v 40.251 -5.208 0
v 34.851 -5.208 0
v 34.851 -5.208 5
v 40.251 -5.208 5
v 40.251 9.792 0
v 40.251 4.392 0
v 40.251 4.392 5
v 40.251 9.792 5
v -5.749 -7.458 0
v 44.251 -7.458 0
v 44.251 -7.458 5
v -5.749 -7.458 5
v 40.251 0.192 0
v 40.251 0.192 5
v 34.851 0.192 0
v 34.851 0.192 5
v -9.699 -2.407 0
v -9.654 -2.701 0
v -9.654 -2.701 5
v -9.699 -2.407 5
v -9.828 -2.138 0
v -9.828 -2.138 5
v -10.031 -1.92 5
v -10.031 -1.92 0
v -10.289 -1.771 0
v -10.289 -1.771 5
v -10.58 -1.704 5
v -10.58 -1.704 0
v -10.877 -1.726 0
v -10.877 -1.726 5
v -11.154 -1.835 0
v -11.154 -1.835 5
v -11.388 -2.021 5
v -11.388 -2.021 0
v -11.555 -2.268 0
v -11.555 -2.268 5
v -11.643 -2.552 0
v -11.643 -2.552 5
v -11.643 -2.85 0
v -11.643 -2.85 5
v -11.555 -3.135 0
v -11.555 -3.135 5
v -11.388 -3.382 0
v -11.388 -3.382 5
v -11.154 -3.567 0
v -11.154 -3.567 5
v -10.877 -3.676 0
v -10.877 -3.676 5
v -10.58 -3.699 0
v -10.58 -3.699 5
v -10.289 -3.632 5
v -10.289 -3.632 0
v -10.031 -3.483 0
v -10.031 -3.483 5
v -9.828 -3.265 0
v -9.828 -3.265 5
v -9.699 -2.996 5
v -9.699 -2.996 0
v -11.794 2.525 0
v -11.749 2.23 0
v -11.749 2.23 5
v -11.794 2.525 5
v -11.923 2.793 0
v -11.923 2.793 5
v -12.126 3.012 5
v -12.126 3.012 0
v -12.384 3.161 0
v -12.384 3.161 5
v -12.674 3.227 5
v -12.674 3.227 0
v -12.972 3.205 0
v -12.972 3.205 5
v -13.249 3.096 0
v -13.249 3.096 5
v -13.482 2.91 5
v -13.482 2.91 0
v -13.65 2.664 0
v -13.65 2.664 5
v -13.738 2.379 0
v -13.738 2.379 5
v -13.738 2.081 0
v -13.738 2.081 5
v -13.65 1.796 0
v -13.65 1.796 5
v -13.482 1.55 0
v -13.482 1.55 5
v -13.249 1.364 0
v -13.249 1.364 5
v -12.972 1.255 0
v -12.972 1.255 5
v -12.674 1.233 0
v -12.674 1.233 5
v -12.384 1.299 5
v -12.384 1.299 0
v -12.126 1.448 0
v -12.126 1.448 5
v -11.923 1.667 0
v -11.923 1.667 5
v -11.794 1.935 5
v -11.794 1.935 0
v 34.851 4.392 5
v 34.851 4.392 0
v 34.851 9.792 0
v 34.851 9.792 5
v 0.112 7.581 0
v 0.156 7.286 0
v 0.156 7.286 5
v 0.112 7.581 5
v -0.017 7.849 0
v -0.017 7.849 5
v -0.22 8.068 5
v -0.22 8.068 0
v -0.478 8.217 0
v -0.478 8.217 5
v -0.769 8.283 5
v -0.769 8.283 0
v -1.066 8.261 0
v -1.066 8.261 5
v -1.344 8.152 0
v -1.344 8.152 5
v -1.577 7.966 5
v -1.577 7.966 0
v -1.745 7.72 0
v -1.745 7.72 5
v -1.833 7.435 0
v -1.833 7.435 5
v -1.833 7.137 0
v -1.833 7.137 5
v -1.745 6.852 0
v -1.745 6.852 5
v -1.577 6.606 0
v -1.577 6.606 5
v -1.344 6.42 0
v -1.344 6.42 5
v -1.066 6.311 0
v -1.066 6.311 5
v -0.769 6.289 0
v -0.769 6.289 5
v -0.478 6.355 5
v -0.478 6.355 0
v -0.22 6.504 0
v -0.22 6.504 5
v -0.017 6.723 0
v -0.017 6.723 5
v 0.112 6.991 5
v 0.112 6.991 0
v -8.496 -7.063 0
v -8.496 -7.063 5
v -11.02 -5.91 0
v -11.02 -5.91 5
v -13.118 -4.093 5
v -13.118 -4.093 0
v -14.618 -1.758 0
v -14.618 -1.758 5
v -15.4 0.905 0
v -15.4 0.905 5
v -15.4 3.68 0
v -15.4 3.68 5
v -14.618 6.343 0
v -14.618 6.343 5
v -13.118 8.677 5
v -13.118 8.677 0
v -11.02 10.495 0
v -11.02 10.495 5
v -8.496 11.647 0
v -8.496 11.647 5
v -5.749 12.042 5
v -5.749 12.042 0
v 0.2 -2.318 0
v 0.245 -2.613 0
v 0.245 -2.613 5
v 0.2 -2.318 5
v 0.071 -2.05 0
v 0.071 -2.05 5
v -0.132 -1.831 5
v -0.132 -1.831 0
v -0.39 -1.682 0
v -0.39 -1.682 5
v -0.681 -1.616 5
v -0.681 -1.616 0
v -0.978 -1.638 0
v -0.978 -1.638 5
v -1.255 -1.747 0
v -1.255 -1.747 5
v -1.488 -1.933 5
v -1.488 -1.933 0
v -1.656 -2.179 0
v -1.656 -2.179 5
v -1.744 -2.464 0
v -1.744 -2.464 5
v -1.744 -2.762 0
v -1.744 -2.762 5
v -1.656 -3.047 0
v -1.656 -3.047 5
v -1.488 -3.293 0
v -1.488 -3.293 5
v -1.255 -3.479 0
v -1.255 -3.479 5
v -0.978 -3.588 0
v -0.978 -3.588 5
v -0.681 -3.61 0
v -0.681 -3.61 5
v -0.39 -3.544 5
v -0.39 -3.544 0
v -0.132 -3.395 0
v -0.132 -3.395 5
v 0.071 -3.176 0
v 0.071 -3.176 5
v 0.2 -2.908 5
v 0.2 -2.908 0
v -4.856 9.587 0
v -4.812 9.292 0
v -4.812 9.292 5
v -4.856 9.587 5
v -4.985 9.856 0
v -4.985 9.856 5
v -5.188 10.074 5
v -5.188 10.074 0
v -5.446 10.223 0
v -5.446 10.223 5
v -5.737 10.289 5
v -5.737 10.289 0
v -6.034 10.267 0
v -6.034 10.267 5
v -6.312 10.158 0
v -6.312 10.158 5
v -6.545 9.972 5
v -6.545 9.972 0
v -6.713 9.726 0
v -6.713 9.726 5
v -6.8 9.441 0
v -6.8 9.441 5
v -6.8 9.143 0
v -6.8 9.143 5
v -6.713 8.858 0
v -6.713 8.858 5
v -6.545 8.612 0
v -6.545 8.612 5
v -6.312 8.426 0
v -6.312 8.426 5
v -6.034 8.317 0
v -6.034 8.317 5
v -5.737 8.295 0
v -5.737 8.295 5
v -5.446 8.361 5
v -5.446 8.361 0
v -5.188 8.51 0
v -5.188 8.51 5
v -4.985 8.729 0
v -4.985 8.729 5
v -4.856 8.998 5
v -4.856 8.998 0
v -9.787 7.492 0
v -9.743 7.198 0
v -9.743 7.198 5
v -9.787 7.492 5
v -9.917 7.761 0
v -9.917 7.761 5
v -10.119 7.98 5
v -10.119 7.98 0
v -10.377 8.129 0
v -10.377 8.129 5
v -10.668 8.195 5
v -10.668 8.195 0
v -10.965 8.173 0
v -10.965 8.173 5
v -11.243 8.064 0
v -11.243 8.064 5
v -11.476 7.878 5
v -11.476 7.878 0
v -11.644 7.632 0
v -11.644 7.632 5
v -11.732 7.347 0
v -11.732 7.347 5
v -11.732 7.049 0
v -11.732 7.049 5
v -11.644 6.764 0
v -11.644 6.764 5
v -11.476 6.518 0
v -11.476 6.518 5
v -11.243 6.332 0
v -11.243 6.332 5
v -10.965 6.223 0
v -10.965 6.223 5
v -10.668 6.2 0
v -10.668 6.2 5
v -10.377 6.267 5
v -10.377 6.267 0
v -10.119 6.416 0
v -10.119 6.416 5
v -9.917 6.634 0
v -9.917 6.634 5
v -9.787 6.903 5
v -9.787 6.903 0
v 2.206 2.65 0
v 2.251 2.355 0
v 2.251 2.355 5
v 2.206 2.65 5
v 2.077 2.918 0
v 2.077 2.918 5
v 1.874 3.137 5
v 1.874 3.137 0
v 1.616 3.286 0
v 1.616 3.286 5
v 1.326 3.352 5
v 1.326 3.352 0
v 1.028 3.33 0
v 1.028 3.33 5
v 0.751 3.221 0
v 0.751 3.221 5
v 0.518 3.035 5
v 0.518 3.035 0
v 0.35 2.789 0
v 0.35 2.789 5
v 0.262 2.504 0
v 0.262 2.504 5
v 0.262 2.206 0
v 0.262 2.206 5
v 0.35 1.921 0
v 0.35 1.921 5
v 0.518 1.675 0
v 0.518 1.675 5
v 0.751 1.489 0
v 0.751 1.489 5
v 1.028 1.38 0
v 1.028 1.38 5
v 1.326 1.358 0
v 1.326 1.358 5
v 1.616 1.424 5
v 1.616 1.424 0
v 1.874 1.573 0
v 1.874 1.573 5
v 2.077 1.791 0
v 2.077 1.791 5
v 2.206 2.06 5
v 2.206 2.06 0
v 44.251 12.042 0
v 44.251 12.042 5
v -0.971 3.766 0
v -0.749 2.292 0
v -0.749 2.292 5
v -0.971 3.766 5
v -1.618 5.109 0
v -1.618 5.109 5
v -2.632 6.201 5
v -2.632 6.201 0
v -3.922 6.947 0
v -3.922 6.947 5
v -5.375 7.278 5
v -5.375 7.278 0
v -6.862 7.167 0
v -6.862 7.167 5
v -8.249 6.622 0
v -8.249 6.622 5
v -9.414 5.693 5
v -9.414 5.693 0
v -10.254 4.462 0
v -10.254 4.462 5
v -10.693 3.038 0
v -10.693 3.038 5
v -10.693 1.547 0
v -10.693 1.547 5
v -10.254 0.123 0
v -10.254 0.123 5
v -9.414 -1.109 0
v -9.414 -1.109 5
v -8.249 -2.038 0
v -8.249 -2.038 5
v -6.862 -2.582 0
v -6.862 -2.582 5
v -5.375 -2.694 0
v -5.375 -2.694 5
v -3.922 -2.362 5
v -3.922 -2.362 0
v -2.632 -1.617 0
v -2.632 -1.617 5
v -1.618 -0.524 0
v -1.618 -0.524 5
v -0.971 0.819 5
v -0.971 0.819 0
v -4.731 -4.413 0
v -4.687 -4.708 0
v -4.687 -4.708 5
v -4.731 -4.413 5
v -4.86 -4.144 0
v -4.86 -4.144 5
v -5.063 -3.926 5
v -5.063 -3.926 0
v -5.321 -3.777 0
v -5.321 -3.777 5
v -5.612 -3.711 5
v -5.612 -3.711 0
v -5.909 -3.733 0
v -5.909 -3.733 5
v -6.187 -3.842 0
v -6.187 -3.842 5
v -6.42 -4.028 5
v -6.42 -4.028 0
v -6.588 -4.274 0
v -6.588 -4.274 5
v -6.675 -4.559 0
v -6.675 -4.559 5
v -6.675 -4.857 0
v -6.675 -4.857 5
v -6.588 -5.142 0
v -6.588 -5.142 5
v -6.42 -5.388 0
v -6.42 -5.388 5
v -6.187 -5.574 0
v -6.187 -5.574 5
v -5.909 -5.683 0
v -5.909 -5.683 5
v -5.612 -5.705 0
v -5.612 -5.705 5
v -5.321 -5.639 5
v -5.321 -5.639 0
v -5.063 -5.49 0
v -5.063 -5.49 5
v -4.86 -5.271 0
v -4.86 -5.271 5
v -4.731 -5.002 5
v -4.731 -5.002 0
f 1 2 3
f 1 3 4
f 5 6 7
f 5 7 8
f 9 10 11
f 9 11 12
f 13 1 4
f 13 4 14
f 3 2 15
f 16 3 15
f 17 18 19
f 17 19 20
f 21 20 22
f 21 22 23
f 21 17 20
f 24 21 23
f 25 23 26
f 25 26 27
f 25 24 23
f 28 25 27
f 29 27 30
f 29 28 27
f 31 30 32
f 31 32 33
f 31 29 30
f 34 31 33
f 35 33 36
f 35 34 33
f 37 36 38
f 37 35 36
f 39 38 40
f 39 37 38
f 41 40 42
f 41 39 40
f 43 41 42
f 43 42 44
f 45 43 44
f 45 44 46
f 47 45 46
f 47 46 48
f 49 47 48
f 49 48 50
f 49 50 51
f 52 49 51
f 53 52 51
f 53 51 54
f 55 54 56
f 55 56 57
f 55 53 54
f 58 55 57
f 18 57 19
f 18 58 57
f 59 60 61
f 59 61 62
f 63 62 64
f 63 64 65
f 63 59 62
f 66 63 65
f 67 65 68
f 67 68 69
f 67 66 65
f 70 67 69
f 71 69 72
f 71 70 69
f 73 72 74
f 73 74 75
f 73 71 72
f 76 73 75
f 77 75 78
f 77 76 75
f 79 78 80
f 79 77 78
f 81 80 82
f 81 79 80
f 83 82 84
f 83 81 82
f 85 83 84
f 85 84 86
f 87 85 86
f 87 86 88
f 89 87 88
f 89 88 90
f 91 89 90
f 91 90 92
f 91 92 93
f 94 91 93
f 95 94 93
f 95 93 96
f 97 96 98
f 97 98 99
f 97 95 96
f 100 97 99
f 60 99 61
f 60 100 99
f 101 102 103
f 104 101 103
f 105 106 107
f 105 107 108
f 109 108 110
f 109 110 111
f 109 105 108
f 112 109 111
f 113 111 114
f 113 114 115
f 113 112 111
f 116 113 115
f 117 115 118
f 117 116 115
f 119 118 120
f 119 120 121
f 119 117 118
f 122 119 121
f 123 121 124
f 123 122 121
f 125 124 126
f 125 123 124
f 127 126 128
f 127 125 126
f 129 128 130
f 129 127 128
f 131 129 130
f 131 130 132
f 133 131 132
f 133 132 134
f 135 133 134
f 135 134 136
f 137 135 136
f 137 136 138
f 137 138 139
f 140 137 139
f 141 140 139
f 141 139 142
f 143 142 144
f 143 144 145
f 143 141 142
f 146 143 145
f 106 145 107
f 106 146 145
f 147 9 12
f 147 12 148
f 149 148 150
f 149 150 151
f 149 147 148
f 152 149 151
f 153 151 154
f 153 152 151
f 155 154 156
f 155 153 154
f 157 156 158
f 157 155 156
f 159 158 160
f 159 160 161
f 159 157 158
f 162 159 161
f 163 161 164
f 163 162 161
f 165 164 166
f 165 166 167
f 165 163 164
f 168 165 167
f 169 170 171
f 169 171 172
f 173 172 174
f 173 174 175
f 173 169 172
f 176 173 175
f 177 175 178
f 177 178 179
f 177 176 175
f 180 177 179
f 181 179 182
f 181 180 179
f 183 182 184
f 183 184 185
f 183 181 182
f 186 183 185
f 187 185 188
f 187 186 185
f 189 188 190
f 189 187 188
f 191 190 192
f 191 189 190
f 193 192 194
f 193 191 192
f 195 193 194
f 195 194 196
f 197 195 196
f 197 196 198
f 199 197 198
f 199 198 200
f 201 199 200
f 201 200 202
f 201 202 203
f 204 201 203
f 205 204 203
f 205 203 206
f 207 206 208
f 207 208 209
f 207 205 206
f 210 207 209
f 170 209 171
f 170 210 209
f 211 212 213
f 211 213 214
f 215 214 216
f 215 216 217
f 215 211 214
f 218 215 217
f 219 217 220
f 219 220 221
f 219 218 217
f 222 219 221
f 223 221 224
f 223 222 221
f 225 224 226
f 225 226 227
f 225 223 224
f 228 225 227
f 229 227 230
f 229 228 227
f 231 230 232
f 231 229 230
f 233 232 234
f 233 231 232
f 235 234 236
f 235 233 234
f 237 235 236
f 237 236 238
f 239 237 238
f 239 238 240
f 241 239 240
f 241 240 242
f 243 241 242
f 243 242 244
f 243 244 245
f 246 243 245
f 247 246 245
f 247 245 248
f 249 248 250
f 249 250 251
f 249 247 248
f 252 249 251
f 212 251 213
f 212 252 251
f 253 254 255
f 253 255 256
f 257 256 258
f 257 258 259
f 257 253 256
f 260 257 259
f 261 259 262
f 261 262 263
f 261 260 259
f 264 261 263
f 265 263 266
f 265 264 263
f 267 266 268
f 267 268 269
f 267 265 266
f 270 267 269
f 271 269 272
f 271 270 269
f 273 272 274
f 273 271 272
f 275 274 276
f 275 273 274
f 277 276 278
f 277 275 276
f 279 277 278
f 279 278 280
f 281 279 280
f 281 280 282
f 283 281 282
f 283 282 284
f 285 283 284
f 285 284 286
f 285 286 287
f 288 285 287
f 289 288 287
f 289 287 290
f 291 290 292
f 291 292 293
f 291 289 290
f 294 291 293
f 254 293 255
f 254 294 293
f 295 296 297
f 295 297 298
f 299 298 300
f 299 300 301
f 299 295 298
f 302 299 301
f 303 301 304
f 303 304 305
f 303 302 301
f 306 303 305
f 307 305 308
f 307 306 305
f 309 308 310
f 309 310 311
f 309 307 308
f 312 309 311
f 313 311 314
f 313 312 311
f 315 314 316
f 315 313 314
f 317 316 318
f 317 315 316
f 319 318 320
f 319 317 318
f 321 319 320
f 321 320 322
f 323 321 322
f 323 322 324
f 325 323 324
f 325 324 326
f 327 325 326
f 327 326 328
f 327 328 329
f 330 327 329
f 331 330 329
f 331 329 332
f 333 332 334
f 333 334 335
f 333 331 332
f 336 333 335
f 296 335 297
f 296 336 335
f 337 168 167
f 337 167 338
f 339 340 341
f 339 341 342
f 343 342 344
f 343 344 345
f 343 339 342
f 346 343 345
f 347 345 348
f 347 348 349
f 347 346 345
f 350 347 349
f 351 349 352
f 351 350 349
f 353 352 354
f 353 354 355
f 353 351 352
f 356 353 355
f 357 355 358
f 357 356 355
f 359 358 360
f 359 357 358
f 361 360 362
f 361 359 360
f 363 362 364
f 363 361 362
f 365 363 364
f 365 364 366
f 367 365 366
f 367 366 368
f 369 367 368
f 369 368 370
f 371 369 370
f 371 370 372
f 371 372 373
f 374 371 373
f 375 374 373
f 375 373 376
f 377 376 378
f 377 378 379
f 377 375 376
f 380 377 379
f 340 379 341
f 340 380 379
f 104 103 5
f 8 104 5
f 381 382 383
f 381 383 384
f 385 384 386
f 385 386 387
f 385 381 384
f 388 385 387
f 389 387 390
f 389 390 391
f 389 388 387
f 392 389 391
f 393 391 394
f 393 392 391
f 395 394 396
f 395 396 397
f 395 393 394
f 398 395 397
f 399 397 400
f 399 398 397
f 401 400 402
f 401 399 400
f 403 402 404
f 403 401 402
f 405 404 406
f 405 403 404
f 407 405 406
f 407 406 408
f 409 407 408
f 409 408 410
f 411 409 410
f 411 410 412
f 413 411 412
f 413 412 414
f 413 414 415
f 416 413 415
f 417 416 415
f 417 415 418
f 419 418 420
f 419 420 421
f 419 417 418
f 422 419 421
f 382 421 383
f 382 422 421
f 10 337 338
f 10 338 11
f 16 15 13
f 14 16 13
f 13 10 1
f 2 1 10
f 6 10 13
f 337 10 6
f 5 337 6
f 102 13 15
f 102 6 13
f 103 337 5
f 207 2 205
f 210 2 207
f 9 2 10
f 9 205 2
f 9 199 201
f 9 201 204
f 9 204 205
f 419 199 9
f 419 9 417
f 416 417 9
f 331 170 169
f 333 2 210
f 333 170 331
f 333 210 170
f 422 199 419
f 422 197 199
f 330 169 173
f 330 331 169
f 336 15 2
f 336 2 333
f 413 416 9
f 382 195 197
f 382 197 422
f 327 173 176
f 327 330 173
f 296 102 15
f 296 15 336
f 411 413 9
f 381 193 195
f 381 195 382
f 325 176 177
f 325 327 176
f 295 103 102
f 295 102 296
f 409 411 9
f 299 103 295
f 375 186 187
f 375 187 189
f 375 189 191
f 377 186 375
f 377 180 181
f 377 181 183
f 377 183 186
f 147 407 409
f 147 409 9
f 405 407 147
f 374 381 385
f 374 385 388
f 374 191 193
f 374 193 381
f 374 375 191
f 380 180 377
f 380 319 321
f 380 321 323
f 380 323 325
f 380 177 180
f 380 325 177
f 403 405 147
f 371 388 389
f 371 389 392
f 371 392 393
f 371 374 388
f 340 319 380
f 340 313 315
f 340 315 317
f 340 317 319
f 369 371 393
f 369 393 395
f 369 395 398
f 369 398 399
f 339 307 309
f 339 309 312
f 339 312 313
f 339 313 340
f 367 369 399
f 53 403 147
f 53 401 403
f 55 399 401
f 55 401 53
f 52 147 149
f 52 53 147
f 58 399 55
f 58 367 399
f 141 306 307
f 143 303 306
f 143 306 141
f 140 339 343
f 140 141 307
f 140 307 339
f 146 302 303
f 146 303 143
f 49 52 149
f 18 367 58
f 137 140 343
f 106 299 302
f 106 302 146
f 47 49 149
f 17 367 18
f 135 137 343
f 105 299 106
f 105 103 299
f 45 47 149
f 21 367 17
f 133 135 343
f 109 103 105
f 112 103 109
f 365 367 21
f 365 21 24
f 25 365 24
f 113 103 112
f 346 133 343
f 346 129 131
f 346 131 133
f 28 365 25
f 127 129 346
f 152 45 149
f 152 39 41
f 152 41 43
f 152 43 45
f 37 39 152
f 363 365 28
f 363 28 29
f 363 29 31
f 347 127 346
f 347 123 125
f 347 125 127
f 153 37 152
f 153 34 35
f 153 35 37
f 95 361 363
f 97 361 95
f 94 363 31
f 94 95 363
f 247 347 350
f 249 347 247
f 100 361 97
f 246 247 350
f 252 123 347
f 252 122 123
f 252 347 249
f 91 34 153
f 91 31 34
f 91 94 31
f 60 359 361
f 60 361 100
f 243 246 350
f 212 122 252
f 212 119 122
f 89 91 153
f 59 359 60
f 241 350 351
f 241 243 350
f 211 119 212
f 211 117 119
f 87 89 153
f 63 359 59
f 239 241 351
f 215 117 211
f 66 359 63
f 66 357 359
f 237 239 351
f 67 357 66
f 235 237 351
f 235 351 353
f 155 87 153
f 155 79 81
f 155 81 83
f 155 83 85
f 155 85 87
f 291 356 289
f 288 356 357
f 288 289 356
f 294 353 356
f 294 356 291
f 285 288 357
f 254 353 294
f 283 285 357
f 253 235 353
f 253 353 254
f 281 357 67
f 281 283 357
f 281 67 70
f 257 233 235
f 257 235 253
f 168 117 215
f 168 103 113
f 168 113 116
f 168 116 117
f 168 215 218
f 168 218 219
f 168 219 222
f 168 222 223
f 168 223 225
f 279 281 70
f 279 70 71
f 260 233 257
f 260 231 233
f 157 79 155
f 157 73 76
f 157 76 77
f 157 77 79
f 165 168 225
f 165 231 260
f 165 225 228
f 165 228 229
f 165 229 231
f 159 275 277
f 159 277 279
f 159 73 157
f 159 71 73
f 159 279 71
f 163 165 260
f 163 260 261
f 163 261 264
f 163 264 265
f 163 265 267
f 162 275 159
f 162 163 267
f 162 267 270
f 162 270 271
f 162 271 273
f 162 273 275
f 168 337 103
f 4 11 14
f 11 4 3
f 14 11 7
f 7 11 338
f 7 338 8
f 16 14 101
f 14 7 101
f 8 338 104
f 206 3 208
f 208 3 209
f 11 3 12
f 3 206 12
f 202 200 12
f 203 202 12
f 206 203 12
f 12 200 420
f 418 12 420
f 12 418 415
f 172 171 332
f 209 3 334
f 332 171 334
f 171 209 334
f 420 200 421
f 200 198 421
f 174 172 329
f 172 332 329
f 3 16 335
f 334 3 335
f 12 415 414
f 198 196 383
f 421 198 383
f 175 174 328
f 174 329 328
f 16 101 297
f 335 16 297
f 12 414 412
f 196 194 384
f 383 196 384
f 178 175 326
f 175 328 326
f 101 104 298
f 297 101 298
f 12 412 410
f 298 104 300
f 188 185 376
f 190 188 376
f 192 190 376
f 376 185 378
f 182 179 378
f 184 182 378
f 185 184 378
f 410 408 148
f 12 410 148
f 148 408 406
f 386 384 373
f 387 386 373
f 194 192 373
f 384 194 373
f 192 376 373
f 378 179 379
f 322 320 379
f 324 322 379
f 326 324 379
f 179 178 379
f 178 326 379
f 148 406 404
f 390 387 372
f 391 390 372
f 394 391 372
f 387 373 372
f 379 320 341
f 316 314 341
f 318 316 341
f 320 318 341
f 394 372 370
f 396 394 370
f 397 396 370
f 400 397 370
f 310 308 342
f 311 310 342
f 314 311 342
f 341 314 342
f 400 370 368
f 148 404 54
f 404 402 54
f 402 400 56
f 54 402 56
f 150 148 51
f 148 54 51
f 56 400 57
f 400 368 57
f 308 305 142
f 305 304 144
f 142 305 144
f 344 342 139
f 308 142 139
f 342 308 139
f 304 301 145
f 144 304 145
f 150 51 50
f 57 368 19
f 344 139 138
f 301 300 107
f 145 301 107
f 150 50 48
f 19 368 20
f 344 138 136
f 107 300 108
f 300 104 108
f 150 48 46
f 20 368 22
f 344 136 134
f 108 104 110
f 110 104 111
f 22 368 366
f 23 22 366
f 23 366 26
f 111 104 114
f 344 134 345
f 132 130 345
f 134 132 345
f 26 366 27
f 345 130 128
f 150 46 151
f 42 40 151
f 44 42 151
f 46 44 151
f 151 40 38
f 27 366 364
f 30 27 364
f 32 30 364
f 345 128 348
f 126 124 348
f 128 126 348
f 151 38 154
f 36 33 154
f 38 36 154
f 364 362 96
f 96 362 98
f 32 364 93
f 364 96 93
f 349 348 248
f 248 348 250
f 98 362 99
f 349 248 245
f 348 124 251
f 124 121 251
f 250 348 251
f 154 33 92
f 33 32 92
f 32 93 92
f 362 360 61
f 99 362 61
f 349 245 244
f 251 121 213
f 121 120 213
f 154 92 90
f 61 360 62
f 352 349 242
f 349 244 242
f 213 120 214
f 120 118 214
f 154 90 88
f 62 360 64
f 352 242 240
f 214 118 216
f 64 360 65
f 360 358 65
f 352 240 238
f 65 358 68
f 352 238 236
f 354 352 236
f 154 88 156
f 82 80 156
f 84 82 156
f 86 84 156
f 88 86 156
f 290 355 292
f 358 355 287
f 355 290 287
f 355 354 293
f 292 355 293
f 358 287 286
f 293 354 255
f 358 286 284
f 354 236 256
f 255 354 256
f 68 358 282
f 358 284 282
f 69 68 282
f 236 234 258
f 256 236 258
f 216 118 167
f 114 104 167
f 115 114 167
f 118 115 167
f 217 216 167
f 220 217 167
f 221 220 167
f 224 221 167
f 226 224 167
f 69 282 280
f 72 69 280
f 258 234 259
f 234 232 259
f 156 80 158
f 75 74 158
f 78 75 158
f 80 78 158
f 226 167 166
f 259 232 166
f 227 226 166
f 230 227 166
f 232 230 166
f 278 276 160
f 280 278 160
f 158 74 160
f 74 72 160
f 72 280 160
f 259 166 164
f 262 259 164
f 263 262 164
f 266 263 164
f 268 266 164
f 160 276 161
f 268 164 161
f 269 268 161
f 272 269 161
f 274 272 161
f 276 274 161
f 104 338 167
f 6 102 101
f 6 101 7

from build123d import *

# Parameters (mm, degrees)
SKETCH2_R           = 1
SKETCH2_R_2         = 5
SKETCH2_W           = 5.4
SKETCH2_H           = 5.4
BOSS_EXTRUDE1_DEPTH = 5


with BuildPart() as part:
    # Sketch2 → Boss-Extrude1 (new body)
    with BuildSketch(Plane.XY):
        with BuildLine():
            Line((-5.74908406, 12.042291654), (44.25091594, 12.042291654))
            Line((44.25091594, 12.042291654), (44.25091594, -7.457708346))
            Line((44.25091594, -7.457708346), (-5.74908406, -7.457708346))
            ThreePointArc((-5.74908406, -7.457708346), (-15.49908406, 2.292291654), (-5.74908406, 12.042291654))
        make_face()
        with Locations((-5.811538636, 9.292291654)):
            Circle(SKETCH2_R, mode=Mode.SUBTRACT)
        with Locations((-10.742794828, 7.197681829)):
            Circle(SKETCH2_R, mode=Mode.SUBTRACT)
        with Locations((-12.74908406, 2.229837079)):
            Circle(SKETCH2_R, mode=Mode.SUBTRACT)
        with Locations((-0.843693885, 7.286002421)):
            Circle(SKETCH2_R, mode=Mode.SUBTRACT)
        with Locations((1.25091594, 2.354746229)):
            Circle(SKETCH2_R, mode=Mode.SUBTRACT)
        with Locations((-0.755373293, -2.613098521)):
            Circle(SKETCH2_R, mode=Mode.SUBTRACT)
        with Locations((-5.686629485, -4.707708346)):
            Circle(SKETCH2_R, mode=Mode.SUBTRACT)
        with Locations((-10.654474236, -2.701419114)):
            Circle(SKETCH2_R, mode=Mode.SUBTRACT)
        with Locations((-5.74908406, 2.292291654)):
            Circle(SKETCH2_R_2, mode=Mode.SUBTRACT)
        with Locations((37.55091594, 7.092291654)):
            Rectangle(SKETCH2_W, SKETCH2_H, mode=Mode.SUBTRACT)
        with Locations((37.55091594, -2.507708346)):
            Rectangle(SKETCH2_W, SKETCH2_H, mode=Mode.SUBTRACT)
    extrude(amount=BOSS_EXTRUDE1_DEPTH)


solid = part.part
